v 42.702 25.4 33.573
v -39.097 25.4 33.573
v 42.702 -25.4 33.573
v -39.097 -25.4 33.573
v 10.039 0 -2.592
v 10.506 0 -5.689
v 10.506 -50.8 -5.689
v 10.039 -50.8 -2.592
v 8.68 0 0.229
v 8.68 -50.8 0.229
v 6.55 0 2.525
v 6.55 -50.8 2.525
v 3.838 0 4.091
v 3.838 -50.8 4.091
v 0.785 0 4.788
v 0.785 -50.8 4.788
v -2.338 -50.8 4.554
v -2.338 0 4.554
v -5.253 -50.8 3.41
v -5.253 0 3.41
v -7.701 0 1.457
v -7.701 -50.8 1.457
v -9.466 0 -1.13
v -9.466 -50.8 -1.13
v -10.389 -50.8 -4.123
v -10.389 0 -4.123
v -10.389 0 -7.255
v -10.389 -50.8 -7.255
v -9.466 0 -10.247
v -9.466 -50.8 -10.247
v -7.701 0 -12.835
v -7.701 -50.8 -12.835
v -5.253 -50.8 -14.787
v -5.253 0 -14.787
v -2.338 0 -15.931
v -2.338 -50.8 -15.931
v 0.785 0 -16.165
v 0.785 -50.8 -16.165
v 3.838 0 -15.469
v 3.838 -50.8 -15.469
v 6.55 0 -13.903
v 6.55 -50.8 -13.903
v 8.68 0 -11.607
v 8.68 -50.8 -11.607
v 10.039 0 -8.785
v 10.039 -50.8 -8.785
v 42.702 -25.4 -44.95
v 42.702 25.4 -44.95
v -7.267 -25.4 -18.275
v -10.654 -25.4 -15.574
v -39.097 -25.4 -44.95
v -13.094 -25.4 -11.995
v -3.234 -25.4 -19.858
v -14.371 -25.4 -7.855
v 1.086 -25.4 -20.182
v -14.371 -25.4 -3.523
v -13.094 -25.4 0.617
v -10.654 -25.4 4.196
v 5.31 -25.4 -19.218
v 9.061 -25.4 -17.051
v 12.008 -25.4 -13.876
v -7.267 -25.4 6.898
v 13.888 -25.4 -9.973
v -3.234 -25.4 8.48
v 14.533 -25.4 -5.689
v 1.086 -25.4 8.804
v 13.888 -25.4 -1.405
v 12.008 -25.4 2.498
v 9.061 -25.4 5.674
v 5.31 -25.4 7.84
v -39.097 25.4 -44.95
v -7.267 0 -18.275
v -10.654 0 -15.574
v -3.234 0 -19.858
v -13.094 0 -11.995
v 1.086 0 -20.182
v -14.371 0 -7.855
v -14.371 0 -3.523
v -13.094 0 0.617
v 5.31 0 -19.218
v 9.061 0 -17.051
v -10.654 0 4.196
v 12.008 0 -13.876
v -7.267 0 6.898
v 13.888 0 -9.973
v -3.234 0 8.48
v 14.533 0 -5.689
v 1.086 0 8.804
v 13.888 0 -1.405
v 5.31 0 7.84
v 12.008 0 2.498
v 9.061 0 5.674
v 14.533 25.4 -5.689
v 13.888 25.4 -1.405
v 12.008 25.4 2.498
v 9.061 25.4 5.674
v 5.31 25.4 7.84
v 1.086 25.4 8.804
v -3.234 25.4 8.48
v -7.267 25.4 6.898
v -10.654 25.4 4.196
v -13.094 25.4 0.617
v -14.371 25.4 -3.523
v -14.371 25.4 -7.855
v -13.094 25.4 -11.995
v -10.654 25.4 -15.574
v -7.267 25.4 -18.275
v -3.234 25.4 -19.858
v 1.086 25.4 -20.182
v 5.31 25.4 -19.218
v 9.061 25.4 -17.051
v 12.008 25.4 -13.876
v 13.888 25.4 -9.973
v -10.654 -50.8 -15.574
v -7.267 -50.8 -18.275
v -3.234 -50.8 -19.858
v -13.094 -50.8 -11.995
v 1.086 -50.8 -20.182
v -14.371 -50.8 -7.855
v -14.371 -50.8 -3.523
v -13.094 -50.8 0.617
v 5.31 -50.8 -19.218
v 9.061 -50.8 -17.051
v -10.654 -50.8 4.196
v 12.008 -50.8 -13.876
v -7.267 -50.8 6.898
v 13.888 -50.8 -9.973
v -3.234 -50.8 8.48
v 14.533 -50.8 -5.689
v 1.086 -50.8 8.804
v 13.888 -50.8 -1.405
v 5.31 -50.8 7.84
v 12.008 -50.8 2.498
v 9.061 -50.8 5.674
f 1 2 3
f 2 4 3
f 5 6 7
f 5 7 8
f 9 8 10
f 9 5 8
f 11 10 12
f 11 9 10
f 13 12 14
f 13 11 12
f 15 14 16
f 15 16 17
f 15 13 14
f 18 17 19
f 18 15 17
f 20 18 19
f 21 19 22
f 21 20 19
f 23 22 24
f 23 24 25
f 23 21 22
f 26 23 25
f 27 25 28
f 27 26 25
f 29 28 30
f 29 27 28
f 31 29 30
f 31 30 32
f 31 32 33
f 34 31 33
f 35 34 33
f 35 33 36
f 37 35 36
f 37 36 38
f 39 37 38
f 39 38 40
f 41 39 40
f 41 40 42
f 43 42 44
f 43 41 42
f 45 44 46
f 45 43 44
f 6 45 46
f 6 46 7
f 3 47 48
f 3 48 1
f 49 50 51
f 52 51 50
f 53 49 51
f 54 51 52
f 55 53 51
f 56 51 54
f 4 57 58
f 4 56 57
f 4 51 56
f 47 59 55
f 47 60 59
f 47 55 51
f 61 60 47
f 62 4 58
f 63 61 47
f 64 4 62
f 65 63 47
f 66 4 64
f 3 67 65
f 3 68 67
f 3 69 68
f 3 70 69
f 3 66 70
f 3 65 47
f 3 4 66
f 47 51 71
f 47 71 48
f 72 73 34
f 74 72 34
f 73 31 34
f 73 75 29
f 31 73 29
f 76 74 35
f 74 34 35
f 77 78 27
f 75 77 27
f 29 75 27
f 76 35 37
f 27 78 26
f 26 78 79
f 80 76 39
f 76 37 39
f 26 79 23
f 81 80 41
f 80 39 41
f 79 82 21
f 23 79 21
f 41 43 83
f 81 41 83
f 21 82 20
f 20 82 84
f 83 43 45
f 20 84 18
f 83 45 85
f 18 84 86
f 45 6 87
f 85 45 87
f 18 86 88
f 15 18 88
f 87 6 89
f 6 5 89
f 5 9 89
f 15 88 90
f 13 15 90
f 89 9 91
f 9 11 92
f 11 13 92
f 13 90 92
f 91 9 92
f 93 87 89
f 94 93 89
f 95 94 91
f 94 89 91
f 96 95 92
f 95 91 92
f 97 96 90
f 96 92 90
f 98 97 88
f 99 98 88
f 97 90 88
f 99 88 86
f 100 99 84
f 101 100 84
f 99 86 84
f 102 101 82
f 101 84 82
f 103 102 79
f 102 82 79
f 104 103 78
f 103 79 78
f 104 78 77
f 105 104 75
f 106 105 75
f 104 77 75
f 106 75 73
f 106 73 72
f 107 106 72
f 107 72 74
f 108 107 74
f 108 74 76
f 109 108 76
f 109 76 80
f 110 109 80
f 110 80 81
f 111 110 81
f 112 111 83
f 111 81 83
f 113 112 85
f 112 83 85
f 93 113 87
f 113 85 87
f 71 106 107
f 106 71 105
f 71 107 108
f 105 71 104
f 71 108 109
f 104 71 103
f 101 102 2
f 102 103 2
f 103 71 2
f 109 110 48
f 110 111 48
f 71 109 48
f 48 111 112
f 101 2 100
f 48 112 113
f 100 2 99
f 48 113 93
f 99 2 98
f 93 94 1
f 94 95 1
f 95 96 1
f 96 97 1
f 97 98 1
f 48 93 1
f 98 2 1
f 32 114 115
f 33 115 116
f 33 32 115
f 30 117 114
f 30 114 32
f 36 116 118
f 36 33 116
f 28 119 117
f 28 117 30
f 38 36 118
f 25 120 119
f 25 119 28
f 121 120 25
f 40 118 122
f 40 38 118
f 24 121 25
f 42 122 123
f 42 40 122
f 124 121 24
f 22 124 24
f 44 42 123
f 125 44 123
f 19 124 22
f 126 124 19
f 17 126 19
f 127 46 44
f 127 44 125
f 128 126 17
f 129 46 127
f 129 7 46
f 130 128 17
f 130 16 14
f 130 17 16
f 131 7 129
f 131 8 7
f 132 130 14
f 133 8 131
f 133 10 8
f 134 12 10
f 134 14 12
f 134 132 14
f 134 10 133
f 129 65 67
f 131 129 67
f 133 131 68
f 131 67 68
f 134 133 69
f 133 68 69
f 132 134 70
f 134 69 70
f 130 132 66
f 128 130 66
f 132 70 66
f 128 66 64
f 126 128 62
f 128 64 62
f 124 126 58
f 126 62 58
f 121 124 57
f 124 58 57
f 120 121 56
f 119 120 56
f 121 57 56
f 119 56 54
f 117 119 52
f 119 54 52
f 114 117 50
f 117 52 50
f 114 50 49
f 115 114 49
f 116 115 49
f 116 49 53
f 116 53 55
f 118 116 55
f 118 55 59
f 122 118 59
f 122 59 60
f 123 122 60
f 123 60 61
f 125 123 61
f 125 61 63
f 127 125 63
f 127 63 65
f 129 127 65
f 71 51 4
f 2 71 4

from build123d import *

# Parameters (mm, degrees)
F0_R     = 14.533387
F0_R_2   = 10.506037
F1_DEPTH = 50.8
F0_W     = 81.798442
F0_H     = 78.523383
F2_DEPTH = 25.4
F3_DEPTH = 25.4


with BuildPart() as f1:
    # F0 (on Front) → F1 (new body)
    with BuildSketch(Plane.XZ):
        with Locations((0, -5.688772)):
            Circle(F0_R)
        with Locations((0, -5.688772)):
            Circle(F0_R_2, mode=Mode.SUBTRACT)
    extrude(amount=F1_DEPTH)

    # F0 (on Front) → F2 (join)
    with BuildSketch(Plane.XZ):
        with Locations((1.802664, -5.688772)):
            Rectangle(F0_W, F0_H)
        with Locations((0, -5.688772)):
            Circle(F0_R, mode=Mode.SUBTRACT)
    extrude(amount=F2_DEPTH)

    # F0 (on Front) → F3 (join)
    with BuildSketch(Plane.XZ):
        with Locations((1.802664, -5.688772)):
            Rectangle(F0_W, F0_H)
        with Locations((0, -5.688772)):
            Circle(F0_R, mode=Mode.SUBTRACT)
    extrude(amount=-F3_DEPTH)


solid = f1.part
